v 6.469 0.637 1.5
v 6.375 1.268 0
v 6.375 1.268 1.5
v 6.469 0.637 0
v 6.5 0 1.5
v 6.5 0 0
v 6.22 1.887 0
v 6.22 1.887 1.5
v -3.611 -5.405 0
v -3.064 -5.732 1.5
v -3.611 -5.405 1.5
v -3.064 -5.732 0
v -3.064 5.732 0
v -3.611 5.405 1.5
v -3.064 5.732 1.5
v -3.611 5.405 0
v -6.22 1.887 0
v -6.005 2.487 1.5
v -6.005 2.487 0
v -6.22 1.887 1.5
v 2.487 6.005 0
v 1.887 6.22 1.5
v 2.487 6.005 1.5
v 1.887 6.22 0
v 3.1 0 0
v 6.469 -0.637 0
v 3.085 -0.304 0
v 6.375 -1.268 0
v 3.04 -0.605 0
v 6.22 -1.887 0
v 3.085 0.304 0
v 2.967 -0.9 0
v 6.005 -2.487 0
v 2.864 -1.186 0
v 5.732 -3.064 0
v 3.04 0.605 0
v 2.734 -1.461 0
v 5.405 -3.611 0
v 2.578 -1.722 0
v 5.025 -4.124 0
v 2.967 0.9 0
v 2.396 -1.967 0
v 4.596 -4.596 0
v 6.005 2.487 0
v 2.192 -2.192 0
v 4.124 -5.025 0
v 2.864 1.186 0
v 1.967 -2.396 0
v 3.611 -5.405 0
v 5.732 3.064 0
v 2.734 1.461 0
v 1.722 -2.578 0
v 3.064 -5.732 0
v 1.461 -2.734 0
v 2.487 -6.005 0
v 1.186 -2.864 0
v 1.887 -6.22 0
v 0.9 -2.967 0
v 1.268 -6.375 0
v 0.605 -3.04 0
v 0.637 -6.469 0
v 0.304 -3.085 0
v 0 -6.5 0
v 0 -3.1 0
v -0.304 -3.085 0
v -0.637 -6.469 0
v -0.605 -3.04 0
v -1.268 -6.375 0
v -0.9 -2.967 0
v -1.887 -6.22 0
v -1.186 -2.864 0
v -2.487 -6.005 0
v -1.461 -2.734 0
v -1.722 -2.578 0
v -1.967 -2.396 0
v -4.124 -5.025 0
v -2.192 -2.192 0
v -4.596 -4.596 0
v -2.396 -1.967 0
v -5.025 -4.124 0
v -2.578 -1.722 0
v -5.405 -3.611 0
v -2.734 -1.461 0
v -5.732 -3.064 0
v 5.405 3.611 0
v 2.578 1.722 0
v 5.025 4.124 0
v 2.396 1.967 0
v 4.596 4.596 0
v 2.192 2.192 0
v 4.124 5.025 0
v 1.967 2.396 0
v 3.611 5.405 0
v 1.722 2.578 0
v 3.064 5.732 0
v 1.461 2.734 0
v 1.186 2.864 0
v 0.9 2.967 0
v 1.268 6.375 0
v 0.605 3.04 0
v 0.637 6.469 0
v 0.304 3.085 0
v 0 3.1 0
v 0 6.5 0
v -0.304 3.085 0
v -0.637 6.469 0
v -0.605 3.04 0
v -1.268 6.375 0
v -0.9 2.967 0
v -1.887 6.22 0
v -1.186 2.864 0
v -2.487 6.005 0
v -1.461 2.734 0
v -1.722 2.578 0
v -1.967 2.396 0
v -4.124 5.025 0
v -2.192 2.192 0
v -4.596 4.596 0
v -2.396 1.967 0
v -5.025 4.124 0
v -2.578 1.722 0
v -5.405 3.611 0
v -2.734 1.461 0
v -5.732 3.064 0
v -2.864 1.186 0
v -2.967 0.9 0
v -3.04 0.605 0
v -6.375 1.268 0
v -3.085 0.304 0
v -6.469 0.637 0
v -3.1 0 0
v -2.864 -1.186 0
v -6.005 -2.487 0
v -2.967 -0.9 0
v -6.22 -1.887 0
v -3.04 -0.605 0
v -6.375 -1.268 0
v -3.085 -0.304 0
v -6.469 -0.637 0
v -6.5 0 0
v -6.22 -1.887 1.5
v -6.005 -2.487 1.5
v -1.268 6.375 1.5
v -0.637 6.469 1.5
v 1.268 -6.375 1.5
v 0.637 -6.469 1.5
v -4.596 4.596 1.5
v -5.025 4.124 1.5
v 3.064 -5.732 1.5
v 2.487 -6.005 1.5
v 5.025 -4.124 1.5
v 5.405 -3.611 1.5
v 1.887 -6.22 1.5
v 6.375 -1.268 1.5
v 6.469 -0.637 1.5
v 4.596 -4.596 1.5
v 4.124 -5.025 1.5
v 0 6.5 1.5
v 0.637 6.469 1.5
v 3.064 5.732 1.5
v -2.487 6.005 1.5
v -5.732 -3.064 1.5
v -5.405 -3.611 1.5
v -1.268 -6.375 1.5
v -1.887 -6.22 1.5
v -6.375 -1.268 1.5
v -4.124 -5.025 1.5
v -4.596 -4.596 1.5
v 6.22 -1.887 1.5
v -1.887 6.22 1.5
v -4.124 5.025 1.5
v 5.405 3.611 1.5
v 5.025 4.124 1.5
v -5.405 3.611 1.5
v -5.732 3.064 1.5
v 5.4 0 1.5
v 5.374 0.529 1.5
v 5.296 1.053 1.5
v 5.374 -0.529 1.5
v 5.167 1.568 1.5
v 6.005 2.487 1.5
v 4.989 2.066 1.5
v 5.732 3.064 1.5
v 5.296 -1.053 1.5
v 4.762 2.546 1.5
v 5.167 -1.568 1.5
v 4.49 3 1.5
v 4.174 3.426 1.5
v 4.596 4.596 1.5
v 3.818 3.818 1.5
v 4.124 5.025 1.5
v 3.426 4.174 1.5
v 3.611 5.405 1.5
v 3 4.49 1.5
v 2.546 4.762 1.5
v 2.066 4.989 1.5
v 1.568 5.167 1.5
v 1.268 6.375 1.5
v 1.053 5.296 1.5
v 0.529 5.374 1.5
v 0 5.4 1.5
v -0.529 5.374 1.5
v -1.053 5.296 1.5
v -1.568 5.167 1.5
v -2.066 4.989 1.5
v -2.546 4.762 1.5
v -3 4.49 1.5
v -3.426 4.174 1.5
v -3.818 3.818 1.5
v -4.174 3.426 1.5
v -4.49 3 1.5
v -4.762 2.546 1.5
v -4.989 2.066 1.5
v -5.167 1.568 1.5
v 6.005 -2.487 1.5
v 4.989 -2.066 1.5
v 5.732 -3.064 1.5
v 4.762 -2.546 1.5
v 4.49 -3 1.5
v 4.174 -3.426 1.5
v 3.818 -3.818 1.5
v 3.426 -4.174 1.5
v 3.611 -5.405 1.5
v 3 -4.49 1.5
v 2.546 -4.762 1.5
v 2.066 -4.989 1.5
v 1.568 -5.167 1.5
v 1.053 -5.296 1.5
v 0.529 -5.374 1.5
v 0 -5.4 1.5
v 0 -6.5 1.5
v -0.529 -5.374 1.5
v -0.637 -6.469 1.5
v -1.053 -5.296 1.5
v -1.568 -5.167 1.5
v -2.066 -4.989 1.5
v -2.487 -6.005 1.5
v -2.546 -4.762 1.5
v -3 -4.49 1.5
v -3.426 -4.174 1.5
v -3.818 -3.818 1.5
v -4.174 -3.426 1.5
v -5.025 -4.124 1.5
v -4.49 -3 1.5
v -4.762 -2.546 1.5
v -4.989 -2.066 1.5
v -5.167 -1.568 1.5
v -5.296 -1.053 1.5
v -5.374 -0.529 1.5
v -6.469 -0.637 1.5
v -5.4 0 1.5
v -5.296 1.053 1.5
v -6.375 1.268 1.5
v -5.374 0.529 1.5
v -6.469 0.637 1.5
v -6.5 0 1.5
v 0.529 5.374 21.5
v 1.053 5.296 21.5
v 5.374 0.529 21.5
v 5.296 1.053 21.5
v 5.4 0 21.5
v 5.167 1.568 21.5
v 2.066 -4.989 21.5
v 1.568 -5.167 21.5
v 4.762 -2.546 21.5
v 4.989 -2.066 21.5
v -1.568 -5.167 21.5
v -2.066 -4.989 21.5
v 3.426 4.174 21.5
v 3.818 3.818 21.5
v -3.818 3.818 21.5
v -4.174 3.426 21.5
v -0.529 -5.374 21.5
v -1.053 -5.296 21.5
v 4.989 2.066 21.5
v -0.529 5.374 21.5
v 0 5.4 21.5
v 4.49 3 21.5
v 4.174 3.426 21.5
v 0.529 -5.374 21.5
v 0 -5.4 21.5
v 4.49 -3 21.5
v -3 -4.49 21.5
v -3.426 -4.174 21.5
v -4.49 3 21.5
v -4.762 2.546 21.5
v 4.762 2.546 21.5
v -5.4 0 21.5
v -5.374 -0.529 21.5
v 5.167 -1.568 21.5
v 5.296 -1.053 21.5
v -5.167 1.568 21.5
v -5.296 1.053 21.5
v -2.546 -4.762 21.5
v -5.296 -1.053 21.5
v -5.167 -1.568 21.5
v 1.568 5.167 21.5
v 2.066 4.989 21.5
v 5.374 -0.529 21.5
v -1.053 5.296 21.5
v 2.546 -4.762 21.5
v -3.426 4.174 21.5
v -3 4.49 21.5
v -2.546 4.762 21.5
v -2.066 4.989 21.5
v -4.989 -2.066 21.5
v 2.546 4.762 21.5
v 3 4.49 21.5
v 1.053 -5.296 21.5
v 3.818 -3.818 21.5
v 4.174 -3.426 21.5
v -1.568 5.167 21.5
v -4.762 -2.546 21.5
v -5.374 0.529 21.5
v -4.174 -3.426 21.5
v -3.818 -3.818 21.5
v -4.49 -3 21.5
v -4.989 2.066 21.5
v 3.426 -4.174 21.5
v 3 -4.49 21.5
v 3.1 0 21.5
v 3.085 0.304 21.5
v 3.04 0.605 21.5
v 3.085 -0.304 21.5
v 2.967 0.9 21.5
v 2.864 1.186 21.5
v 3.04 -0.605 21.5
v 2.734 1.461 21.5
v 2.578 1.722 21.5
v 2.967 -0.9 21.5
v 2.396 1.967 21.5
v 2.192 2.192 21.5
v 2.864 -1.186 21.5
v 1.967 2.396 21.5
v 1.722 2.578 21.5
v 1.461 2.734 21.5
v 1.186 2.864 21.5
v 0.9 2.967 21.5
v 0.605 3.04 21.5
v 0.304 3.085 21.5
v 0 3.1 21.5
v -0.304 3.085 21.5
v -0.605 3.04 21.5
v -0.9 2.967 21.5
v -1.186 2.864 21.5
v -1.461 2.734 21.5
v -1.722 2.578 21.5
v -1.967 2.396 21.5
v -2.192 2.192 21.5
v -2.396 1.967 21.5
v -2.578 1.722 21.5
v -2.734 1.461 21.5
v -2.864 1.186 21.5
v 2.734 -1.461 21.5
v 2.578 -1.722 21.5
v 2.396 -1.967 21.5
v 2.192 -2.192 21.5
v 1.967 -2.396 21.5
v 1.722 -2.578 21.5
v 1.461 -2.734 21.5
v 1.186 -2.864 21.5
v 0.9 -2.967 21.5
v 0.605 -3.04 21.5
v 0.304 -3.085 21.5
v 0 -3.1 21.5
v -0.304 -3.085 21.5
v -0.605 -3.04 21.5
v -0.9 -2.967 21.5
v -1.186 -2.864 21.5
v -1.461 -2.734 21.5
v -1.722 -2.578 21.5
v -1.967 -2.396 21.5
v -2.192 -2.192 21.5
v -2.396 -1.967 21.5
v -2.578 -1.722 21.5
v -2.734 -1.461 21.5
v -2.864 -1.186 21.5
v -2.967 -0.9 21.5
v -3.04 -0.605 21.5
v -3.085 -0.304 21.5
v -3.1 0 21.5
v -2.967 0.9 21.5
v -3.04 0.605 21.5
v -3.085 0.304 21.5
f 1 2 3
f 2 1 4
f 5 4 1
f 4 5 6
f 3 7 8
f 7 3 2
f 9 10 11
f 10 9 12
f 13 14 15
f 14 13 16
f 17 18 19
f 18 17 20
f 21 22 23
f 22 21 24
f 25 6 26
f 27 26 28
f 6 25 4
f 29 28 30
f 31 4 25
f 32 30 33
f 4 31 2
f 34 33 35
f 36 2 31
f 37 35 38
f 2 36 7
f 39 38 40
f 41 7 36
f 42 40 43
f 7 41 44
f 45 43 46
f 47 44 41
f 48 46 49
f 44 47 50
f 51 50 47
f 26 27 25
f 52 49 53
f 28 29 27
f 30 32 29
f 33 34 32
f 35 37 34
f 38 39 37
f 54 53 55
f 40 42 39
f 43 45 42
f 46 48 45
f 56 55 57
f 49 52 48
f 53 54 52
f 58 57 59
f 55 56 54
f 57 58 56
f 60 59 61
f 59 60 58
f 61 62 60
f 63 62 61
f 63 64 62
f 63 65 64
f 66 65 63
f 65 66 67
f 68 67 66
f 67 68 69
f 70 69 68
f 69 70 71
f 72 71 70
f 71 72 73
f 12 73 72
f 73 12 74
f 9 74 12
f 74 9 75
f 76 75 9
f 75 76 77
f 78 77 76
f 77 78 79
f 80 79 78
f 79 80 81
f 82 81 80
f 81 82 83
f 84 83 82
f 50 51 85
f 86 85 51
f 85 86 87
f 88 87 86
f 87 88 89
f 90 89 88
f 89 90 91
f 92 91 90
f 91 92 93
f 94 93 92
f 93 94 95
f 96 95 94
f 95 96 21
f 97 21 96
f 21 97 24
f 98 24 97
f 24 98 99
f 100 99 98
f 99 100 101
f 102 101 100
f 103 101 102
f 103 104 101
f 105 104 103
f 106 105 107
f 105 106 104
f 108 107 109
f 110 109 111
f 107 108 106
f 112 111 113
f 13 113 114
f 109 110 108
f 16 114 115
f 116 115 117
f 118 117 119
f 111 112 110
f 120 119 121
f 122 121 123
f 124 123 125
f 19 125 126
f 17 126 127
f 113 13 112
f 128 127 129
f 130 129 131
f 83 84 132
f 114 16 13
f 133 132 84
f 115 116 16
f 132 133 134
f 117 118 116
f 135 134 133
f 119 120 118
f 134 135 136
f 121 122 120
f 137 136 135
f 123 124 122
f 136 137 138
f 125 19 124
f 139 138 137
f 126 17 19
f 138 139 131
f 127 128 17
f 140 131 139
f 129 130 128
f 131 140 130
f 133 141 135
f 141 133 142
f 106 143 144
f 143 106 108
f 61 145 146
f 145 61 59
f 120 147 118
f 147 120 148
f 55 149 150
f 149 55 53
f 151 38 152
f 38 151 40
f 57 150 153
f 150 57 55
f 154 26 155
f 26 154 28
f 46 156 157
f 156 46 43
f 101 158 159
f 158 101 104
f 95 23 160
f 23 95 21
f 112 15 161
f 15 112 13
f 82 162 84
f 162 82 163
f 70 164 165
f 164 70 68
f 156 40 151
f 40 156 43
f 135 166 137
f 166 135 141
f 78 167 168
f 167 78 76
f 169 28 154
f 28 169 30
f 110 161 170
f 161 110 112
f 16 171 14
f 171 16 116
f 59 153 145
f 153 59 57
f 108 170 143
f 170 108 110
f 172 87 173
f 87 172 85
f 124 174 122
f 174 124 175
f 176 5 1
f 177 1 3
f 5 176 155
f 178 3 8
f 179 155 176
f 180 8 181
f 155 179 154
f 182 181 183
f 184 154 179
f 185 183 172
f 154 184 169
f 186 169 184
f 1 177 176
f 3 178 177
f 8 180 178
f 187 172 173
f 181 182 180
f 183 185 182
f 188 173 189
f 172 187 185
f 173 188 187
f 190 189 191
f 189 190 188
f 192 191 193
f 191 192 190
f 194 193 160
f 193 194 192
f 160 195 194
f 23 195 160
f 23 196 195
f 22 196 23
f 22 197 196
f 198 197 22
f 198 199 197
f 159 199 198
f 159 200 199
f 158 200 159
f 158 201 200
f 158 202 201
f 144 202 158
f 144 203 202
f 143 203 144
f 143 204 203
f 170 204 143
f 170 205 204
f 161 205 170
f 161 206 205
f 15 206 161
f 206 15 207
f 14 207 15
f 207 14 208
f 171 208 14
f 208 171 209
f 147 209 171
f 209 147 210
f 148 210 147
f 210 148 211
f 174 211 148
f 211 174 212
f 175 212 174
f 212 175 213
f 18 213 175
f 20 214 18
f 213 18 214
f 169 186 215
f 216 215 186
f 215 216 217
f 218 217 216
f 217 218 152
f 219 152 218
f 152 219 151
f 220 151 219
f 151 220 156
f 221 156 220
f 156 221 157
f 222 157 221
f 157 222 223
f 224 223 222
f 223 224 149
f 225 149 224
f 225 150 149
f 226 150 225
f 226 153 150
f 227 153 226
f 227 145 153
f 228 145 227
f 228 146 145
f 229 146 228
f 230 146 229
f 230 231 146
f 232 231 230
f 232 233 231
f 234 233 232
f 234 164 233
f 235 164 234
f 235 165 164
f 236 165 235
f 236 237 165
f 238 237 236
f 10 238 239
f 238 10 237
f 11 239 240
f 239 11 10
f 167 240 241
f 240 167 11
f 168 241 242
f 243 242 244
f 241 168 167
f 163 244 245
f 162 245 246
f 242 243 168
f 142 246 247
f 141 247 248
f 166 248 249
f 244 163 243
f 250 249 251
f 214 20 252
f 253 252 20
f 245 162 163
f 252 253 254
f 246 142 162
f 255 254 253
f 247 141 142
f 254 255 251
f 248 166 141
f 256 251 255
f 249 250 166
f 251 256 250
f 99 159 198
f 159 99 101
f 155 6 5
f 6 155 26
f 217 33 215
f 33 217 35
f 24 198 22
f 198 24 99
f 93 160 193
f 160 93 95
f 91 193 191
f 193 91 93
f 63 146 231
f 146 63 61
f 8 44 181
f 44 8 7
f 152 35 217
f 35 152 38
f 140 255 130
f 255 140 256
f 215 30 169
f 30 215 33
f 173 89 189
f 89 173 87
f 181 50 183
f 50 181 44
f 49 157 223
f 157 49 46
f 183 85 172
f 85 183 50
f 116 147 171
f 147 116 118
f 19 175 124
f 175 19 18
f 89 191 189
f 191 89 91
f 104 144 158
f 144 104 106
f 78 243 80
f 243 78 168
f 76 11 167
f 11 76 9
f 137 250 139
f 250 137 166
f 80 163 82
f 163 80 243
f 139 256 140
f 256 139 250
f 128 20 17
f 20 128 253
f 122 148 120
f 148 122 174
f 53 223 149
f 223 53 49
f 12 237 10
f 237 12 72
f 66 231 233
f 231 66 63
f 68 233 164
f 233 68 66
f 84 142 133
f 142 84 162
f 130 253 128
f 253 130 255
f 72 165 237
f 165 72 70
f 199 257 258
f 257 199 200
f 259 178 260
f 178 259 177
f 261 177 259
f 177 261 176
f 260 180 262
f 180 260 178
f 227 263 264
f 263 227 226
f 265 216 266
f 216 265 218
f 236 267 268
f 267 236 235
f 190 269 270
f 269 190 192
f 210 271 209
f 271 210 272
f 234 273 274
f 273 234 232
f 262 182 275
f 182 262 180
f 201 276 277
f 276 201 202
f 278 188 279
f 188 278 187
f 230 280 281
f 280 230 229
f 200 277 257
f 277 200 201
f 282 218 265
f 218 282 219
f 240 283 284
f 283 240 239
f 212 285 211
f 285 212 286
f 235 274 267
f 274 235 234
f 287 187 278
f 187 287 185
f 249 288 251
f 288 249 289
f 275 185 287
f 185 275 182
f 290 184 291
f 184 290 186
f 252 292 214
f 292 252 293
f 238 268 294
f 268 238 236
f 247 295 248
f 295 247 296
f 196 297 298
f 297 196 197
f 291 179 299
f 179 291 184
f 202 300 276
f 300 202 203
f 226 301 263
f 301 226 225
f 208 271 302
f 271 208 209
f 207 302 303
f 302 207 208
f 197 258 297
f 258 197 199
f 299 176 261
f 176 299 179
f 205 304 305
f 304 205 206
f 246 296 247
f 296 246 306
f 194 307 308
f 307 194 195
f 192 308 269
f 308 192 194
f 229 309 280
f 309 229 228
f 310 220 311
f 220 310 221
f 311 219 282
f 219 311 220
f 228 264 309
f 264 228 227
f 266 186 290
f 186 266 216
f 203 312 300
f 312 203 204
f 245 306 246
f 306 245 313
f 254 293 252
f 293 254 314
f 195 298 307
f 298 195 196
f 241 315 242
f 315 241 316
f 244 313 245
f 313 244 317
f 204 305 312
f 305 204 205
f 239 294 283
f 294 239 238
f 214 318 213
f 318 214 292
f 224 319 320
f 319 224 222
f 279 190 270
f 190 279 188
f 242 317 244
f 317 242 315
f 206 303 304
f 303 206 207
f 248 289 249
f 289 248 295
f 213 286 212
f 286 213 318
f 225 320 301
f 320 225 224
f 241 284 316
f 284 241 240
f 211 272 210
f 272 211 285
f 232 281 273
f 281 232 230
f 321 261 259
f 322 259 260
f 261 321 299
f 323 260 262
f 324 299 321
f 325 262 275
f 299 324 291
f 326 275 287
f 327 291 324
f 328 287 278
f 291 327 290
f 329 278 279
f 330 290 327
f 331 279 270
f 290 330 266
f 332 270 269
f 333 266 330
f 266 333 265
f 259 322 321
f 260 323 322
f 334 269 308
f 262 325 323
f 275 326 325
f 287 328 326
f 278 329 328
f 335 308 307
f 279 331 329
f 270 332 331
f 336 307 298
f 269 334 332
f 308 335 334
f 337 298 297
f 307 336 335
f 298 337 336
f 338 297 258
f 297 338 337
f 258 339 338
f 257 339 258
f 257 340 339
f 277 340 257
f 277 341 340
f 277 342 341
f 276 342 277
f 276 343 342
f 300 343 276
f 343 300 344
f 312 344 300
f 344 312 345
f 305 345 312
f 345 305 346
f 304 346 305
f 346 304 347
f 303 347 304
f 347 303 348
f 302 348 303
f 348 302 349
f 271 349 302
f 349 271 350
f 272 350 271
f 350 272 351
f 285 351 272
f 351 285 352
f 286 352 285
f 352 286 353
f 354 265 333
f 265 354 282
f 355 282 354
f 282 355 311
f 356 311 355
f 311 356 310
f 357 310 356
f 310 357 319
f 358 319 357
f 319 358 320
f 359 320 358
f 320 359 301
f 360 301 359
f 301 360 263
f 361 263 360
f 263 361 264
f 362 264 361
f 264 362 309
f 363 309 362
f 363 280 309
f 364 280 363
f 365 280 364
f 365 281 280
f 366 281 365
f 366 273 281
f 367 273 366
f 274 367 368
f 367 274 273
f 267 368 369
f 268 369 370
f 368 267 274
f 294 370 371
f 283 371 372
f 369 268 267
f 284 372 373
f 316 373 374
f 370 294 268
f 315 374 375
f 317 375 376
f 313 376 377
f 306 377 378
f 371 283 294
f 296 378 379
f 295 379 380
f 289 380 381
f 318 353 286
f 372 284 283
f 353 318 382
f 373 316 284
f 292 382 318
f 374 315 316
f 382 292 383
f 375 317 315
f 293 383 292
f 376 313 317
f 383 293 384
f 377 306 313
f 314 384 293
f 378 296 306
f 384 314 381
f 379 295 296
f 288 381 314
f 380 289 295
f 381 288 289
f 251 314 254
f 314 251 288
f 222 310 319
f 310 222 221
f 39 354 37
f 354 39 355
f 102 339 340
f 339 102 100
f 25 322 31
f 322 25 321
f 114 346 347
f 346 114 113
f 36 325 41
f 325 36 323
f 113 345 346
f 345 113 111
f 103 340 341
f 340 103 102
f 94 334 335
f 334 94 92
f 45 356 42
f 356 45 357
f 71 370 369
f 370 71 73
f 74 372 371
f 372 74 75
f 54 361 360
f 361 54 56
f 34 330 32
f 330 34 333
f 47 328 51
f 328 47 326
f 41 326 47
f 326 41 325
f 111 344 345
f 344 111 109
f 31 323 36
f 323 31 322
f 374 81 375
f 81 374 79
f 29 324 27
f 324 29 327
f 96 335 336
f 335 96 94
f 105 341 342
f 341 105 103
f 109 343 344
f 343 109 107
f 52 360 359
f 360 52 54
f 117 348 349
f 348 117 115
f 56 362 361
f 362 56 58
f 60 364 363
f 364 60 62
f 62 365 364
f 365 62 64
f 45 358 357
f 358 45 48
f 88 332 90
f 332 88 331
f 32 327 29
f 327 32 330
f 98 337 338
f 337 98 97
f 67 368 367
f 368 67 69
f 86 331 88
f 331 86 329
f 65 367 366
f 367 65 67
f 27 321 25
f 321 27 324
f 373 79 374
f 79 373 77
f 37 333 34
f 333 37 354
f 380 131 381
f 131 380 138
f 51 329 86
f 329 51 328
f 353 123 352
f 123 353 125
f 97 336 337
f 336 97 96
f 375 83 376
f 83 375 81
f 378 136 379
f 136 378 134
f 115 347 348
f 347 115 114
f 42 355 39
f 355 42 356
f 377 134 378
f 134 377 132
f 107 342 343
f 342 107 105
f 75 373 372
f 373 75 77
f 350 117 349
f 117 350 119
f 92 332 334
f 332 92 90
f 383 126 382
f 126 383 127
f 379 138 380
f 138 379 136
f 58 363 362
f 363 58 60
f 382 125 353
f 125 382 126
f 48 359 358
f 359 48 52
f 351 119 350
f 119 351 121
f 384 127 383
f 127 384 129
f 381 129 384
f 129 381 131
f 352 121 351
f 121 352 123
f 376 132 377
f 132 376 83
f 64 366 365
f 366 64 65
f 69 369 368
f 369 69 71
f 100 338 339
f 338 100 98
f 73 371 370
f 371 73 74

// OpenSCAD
// Adapter sleeve: 0.2 mL PCR tube for a 1.5 mL tube rack hole
// Print orientation: collar on the bed (z = 0), sleeve body upward.

$fn = 64;

// ---- Dimensions (mm) ----
collar_d      = 13;    // collar outer diameter
collar_h      = 1.5;   // collar thickness (z = 0 to 1.5)
sleeve_od     = 10.8;  // sleeve body outer diameter
sleeve_top_z  = 21.5;  // top of sleeve body (z)
bore_d        = 6.2;   // through-bore diameter
eps           = 0.5;   // cutter overshoot past faces

// ---- Model ----
difference() {
    union() {
        // Collar
        cylinder(d = collar_d, h = collar_h);
        // Sleeve body (overlaps slightly into collar for a clean union)
        translate([0, 0, collar_h - 0.01])
            cylinder(d = sleeve_od, h = sleeve_top_z - collar_h + 0.01);
    }
    // Straight through-bore
    translate([0, 0, -eps])
        cylinder(d = bore_d, h = sleeve_top_z + 2 * eps);
}
